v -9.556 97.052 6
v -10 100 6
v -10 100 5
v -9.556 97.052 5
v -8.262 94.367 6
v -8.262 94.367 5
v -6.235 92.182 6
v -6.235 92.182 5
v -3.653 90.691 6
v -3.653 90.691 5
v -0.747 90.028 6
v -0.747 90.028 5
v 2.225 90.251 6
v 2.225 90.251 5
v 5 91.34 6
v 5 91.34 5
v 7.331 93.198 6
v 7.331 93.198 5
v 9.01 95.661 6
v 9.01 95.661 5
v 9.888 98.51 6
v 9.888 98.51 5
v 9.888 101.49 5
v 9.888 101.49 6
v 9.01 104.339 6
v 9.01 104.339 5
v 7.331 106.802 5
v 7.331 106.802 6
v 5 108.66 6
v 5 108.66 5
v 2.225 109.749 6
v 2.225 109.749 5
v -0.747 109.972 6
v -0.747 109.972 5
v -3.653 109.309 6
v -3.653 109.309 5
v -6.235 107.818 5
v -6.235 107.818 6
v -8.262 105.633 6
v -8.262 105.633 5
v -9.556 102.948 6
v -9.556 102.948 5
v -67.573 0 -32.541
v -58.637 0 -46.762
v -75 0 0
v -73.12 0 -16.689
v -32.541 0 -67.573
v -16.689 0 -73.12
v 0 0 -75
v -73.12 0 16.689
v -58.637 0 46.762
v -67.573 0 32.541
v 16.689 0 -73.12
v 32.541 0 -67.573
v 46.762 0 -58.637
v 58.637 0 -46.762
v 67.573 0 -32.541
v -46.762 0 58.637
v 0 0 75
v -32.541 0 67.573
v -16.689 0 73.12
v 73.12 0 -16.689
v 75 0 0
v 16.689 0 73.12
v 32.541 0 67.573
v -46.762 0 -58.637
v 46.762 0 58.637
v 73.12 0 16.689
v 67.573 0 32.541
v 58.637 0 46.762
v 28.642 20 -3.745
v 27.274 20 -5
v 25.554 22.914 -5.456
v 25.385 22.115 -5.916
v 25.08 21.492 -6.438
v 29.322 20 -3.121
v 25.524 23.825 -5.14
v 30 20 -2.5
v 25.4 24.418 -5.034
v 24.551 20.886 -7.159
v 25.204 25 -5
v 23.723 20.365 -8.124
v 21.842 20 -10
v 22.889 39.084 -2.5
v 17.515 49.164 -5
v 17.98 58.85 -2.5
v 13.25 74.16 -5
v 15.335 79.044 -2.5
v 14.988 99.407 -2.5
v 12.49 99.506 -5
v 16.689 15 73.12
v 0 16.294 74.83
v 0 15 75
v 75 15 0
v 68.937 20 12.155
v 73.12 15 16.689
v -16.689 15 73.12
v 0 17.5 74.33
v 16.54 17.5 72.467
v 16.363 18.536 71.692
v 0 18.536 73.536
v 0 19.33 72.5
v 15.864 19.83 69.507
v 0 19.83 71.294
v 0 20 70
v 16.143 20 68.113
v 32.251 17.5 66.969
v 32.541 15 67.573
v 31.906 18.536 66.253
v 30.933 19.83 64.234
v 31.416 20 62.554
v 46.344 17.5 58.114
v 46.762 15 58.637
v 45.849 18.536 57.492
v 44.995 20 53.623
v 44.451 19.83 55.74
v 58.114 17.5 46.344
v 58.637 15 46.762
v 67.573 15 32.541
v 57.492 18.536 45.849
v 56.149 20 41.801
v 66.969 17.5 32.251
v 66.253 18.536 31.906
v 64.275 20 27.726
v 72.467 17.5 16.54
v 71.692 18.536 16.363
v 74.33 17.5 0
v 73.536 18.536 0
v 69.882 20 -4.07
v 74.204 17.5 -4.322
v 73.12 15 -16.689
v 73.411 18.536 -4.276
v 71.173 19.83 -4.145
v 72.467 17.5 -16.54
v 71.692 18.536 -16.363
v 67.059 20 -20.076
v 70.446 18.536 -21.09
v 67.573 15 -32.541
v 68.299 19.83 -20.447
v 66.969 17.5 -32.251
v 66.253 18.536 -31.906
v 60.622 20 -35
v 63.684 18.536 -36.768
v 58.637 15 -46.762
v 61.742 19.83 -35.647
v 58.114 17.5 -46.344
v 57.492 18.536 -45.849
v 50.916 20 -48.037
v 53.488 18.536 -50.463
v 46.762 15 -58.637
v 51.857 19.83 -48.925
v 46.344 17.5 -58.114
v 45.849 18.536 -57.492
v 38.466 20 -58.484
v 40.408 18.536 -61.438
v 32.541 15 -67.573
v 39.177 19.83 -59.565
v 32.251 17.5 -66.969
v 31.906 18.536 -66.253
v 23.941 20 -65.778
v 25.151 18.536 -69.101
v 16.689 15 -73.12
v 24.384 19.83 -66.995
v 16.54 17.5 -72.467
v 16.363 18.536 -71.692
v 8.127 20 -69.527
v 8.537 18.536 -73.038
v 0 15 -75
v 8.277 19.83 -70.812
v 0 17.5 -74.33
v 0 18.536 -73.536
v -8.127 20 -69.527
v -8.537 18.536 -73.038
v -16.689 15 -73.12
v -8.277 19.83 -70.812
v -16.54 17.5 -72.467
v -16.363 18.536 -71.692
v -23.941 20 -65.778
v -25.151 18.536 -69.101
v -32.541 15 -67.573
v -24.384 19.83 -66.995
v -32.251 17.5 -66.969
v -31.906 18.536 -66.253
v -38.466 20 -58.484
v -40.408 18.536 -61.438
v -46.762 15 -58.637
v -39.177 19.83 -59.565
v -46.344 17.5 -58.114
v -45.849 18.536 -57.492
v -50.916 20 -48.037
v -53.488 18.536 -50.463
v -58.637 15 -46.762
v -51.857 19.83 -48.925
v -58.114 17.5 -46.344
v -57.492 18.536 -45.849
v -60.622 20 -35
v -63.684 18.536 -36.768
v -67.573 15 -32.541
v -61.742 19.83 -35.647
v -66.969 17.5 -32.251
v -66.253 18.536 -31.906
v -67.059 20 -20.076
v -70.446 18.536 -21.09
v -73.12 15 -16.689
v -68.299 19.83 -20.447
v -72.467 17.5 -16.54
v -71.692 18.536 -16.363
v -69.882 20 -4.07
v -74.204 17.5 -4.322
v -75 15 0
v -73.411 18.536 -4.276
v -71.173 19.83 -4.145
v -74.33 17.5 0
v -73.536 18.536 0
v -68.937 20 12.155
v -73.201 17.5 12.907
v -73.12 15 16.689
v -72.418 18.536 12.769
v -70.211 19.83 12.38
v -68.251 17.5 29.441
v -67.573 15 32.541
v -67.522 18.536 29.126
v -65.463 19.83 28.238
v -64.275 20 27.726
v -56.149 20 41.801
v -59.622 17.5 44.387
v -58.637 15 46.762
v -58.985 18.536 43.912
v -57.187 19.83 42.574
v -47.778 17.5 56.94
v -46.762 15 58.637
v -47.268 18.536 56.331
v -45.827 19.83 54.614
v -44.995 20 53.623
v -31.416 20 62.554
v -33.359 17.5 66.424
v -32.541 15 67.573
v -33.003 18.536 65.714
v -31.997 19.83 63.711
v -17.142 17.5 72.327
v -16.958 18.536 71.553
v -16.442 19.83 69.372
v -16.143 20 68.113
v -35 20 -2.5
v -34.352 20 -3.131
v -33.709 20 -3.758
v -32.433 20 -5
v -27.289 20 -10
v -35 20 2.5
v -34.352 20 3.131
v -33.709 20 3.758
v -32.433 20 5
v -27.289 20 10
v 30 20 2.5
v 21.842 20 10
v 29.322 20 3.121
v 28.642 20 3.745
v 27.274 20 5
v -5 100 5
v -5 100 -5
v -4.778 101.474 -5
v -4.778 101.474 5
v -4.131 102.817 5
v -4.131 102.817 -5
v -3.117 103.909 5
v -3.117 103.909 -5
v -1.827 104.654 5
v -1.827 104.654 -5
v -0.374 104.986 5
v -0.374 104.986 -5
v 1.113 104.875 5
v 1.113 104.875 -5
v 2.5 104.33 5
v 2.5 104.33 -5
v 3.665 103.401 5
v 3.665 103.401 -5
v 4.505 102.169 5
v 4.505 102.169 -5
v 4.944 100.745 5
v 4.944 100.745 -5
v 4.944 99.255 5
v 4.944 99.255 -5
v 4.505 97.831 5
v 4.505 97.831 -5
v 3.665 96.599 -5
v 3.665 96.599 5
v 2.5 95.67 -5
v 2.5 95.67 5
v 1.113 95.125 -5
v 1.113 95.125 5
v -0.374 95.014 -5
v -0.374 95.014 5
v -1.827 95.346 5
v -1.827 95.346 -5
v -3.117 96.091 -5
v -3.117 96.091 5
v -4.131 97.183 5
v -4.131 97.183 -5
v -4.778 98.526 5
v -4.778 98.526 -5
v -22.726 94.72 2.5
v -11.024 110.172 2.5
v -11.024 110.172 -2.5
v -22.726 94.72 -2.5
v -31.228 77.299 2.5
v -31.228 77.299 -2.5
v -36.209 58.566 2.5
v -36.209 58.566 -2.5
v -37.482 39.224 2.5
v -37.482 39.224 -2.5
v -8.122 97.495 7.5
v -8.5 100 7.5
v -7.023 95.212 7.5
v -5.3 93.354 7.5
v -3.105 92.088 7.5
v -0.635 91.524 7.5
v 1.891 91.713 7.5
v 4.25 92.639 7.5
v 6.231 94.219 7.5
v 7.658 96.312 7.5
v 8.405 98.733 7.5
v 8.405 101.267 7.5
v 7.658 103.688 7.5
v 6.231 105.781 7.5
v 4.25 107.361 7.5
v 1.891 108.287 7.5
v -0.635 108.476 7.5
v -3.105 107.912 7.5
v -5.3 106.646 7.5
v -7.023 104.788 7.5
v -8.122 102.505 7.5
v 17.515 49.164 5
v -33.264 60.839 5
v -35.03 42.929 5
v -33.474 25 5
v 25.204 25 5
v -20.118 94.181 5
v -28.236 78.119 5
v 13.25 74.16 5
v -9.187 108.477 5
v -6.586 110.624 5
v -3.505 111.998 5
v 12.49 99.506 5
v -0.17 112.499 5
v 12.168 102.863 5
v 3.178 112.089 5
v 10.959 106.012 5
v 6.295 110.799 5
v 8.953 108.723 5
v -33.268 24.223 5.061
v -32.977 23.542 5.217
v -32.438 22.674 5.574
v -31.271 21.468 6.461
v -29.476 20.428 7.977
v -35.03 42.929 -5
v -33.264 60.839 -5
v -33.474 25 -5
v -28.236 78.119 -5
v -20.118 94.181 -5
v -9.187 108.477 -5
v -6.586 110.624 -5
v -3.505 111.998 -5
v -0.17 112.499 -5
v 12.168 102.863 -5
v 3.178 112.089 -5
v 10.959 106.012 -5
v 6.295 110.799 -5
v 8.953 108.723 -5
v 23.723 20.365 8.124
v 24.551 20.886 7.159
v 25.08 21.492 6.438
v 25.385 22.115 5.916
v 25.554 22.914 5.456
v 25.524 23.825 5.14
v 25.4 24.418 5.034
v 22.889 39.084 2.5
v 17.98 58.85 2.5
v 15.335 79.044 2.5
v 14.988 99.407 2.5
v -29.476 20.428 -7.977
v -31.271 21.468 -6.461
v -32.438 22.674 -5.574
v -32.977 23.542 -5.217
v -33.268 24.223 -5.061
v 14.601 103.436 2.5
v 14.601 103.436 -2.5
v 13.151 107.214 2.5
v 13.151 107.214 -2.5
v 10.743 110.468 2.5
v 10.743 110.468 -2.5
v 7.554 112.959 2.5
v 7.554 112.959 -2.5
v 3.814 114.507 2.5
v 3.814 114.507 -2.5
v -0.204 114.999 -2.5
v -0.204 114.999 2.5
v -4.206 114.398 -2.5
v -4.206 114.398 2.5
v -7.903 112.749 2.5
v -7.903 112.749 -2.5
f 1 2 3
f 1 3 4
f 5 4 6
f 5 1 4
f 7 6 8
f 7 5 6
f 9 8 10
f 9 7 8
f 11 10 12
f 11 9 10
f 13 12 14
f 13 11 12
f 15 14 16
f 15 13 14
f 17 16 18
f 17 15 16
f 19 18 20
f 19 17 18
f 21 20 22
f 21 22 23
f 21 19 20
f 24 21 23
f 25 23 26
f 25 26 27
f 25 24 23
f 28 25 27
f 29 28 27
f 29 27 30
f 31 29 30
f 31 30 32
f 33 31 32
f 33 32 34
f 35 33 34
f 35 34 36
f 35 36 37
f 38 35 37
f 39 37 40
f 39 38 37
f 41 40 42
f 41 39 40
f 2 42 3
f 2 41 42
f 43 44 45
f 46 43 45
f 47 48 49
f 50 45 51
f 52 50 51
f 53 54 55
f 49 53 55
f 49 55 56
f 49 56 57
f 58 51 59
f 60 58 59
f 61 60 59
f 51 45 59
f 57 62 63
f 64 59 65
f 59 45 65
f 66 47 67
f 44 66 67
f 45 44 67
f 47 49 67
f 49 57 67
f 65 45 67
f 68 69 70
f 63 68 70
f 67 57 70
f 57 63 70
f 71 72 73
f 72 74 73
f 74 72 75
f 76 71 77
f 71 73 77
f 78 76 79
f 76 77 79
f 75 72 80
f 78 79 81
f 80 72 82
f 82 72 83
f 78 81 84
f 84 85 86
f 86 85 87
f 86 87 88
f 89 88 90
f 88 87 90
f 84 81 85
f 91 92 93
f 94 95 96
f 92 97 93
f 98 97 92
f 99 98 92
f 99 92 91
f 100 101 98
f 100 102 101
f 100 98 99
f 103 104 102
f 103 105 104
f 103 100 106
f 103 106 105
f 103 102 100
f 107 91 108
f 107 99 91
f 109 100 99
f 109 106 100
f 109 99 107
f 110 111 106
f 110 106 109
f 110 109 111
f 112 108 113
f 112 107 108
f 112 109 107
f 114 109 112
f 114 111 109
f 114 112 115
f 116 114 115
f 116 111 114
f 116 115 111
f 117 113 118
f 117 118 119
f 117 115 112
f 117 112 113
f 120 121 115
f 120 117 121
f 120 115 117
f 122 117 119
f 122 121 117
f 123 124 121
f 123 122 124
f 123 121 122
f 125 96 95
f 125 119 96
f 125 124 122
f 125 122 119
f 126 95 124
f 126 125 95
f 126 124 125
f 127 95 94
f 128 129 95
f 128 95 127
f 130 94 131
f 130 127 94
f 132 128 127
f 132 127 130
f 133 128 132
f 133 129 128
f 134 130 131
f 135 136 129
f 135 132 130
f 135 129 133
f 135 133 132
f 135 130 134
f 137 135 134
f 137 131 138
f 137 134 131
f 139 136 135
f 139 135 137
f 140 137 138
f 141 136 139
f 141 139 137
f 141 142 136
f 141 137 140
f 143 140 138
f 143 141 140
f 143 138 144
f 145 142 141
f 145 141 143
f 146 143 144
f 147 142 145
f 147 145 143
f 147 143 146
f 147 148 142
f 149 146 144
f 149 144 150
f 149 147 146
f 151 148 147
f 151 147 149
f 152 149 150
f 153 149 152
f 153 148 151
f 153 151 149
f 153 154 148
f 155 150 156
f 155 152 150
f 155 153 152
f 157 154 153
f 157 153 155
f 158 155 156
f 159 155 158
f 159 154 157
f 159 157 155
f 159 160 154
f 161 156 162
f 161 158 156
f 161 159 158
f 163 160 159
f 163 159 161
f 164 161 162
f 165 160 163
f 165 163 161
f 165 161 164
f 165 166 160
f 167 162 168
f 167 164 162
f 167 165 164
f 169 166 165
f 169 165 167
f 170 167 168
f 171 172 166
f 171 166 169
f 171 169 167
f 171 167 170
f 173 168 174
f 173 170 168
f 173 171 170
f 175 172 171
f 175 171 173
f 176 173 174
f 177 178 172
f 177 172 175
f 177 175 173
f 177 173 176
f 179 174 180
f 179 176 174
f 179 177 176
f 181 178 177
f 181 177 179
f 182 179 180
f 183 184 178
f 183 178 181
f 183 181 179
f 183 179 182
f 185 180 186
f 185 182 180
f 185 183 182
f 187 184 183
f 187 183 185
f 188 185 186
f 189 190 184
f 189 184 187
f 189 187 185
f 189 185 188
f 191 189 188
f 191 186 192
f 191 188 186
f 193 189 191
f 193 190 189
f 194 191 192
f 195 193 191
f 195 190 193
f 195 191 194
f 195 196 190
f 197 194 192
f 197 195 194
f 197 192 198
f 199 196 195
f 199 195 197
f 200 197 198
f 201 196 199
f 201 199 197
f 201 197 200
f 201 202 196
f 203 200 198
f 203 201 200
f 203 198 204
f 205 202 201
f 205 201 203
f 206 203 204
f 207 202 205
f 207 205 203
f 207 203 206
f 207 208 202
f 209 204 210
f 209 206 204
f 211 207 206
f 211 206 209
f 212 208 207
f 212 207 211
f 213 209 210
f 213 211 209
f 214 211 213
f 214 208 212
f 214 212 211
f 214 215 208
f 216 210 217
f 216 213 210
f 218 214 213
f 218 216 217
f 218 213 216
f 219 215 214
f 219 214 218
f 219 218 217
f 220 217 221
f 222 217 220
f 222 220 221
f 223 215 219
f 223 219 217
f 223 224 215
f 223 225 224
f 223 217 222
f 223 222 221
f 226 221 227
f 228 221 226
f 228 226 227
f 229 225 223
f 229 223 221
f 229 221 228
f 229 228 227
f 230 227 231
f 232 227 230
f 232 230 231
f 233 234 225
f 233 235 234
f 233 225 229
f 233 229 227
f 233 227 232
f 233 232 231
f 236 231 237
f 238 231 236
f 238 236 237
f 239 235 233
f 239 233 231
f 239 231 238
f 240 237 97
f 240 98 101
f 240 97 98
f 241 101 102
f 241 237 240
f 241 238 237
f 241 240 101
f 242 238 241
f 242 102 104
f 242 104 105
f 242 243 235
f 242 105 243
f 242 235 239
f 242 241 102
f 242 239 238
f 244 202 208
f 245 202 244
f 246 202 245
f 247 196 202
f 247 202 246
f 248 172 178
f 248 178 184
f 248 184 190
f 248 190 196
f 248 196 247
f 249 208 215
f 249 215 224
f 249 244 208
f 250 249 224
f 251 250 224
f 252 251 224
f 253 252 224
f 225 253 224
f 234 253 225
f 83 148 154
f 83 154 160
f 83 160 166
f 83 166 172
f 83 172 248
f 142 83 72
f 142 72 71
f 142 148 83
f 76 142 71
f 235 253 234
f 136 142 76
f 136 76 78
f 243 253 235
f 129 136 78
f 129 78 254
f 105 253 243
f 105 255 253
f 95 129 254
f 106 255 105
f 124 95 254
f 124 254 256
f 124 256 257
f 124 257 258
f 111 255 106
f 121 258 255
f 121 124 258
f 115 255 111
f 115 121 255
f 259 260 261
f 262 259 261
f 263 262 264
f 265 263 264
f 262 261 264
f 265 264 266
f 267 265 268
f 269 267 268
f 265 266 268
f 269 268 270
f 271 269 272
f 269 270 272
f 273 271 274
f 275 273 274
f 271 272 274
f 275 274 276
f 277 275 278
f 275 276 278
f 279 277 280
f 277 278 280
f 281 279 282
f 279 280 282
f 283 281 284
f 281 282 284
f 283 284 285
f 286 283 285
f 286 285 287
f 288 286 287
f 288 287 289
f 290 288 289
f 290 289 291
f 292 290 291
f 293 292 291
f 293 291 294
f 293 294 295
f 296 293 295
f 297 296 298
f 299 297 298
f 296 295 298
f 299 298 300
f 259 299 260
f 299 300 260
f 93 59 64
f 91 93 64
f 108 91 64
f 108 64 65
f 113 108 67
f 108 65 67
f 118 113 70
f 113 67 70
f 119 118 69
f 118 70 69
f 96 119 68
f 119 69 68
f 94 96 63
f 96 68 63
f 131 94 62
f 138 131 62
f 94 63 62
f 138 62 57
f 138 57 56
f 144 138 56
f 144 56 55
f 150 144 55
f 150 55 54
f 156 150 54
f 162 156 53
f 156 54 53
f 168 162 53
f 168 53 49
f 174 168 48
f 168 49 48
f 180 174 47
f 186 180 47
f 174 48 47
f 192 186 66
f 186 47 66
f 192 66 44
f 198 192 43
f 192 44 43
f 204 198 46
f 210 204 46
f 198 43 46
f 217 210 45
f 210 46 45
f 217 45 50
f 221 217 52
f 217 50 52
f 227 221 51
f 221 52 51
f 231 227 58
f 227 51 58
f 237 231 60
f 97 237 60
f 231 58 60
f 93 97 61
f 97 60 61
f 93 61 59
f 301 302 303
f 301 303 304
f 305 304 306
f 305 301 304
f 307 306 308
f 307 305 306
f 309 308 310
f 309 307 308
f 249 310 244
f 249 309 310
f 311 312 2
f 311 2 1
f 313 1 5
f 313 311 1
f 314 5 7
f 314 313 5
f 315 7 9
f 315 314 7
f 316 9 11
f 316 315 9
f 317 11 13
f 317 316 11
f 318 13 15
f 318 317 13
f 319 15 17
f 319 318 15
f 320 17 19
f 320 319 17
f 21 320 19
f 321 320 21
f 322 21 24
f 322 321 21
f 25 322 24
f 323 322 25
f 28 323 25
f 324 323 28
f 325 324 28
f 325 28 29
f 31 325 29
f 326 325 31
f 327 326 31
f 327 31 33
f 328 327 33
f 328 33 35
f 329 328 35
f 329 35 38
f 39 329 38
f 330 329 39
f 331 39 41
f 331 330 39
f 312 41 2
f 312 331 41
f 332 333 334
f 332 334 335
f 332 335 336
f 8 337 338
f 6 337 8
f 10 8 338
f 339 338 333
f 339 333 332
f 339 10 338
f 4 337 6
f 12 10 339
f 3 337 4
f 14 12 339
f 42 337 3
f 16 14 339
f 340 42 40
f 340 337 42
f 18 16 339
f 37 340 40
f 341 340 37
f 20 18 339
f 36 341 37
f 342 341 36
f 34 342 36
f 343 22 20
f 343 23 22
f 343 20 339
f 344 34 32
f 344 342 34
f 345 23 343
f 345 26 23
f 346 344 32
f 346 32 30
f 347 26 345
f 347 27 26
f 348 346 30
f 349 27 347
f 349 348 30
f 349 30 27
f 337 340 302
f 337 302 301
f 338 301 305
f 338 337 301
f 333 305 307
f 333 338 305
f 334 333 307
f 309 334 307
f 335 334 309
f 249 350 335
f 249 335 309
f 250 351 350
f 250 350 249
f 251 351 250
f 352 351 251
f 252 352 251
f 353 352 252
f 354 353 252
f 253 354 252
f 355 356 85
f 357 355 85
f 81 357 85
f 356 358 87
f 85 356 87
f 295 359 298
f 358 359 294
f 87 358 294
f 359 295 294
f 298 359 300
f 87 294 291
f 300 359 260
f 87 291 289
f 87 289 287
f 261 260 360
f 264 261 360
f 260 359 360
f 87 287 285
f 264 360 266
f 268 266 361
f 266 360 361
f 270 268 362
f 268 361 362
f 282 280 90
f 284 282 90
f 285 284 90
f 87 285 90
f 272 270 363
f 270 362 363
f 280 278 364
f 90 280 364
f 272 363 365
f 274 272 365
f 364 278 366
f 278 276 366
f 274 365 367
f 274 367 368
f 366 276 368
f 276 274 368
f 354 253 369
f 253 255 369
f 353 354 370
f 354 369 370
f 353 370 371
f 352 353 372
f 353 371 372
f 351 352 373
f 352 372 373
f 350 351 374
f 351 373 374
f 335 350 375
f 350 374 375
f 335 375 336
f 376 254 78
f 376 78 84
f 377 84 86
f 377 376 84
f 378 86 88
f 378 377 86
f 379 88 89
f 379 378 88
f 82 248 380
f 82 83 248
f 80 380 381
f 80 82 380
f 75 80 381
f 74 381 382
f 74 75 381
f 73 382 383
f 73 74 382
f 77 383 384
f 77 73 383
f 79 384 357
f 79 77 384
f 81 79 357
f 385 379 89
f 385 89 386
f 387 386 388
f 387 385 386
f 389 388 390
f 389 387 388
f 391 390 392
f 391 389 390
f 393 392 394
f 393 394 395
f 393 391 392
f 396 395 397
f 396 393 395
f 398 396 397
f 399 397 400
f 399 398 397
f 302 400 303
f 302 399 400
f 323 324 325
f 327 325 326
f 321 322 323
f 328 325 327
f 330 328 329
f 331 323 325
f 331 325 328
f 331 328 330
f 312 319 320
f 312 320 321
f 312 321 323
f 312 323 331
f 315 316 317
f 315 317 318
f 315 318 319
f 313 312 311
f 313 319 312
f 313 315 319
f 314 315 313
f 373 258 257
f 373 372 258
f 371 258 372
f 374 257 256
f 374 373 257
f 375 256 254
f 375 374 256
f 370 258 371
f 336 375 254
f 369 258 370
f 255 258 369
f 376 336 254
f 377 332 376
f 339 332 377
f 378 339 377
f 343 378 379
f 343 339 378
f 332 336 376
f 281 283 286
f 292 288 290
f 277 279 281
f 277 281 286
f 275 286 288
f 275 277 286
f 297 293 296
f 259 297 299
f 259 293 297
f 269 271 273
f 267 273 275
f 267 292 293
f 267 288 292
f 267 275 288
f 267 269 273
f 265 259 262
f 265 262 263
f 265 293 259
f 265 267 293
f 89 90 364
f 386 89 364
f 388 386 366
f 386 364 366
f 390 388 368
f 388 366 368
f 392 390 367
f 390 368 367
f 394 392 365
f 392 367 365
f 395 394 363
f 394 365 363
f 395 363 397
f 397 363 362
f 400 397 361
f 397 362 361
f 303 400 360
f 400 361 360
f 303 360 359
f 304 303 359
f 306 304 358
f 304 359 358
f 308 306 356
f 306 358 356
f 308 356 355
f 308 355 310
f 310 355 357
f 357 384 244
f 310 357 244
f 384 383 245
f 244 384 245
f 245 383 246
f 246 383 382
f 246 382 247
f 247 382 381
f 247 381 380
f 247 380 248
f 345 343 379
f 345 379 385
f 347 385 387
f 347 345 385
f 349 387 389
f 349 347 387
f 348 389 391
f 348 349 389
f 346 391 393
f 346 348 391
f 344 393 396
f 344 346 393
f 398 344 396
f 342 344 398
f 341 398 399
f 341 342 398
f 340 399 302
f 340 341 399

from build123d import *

# Parameters (mm, degrees)
SKETCH2_R           = 75
BOSS_EXTRUDE1_DEPTH = 20
FILLET1_R           = 5
BOSS_EXTRUDE2_DEPTH = 5
CHAMFER14_SIZE      = 2.5
CHAMFER15_SIZE      = 2.5
FILLET4_R           = 5
FILLET5_R           = 5
SKETCH4_R           = 10
BOSS_EXTRUDE8_DEPTH = 2.5
SKETCH5_R           = 5
CUT_EXTRUDE1_DEPTH  = 10
CHAMFER24_SIZE      = 1.5


with BuildPart() as part:
    # Sketch2 → Boss-Extrude1 (new body)
    with BuildSketch(Plane(origin=(0, 0, 0), x_dir=(1, 0, 0), z_dir=(0, 1, 0))):
        with Locations(Location((0, 0, 0), (0, 0, 270))):
            Circle(SKETCH2_R)
    extrude(amount=BOSS_EXTRUDE1_DEPTH)

    # Fillet1
    fillet1_edges = [part.edges().sort_by_distance(p)[0] for p in [
        (0, 20, -75),
    ]]
    fillet(fillet1_edges, radius=FILLET1_R)

    # Sketch3 → Boss-Extrude2 (add, symmetric)
    with BuildSketch(Plane.XY):
        with BuildLine():
            Line((-35, 20), (30, 20))
            ThreePointArc((30, 20), (17.980206761, 58.849975441), (14.988260139, 99.406655245))
            ThreePointArc((14.988260139, 99.406655245), (5.736147111, 113.859892363), (-11.023885447, 110.172214589))
            ThreePointArc((-11.023885447, 110.172214589), (-34.173411443, 68.05385799), (-35, 20))
        make_face()
    extrude(amount=BOSS_EXTRUDE2_DEPTH, both=True)

    # Chamfer14
    chamfer14_edges = [part.edges().sort_by_distance(p)[0] for p in [
        (-34.173411443, 68.05385799, -5),
        (17.980206761, 58.849975441, -5),
        (5.736147111, 113.859892363, -5),
    ]]
    chamfer(chamfer14_edges, length=CHAMFER14_SIZE)

    # Chamfer15
    chamfer15_edges = [part.edges().sort_by_distance(p)[0] for p in [
        (-34.173411443, 68.05385799, 5),
        (17.980206761, 58.849975441, 5),
        (5.736147111, 113.859892363, 5),
    ]]
    chamfer(chamfer15_edges, length=CHAMFER15_SIZE)

    # Fillet4
    fillet4_edges = [part.edges().sort_by_distance(p)[0] for p in [
        (-2.579776455, 20, 5),
    ]]
    fillet(fillet4_edges, radius=FILLET4_R)

    # Fillet5
    fillet5_edges = [part.edges().sort_by_distance(p)[0] for p in [
        (-2.579776455, 20, -5),
    ]]
    fillet(fillet5_edges, radius=FILLET5_R)

    # Sketch4 → Boss-Extrude8 (add, symmetric)
    with BuildSketch(Plane.XY.offset(5)):
        with Locations(Location((0, 100, 0), (0, 0, 180))):
            Circle(SKETCH4_R)
    extrude(amount=BOSS_EXTRUDE8_DEPTH, both=True)

    # Sketch5 → Cut-Extrude1 (cut)
    with BuildSketch(Plane(origin=(0, 0, -5), x_dir=(-1, 0, 0), z_dir=(0, 0, -1))):
        with Locations((0, 100)):
            Circle(SKETCH5_R)
    extrude(amount=-CUT_EXTRUDE1_DEPTH, mode=Mode.SUBTRACT)

    # Chamfer24
    chamfer24_edges = [part.edges().sort_by_distance(p)[0] for p in [
        (10, 100, 7.5),
    ]]
    chamfer(chamfer24_edges, length=CHAMFER24_SIZE)


solid = part.part
